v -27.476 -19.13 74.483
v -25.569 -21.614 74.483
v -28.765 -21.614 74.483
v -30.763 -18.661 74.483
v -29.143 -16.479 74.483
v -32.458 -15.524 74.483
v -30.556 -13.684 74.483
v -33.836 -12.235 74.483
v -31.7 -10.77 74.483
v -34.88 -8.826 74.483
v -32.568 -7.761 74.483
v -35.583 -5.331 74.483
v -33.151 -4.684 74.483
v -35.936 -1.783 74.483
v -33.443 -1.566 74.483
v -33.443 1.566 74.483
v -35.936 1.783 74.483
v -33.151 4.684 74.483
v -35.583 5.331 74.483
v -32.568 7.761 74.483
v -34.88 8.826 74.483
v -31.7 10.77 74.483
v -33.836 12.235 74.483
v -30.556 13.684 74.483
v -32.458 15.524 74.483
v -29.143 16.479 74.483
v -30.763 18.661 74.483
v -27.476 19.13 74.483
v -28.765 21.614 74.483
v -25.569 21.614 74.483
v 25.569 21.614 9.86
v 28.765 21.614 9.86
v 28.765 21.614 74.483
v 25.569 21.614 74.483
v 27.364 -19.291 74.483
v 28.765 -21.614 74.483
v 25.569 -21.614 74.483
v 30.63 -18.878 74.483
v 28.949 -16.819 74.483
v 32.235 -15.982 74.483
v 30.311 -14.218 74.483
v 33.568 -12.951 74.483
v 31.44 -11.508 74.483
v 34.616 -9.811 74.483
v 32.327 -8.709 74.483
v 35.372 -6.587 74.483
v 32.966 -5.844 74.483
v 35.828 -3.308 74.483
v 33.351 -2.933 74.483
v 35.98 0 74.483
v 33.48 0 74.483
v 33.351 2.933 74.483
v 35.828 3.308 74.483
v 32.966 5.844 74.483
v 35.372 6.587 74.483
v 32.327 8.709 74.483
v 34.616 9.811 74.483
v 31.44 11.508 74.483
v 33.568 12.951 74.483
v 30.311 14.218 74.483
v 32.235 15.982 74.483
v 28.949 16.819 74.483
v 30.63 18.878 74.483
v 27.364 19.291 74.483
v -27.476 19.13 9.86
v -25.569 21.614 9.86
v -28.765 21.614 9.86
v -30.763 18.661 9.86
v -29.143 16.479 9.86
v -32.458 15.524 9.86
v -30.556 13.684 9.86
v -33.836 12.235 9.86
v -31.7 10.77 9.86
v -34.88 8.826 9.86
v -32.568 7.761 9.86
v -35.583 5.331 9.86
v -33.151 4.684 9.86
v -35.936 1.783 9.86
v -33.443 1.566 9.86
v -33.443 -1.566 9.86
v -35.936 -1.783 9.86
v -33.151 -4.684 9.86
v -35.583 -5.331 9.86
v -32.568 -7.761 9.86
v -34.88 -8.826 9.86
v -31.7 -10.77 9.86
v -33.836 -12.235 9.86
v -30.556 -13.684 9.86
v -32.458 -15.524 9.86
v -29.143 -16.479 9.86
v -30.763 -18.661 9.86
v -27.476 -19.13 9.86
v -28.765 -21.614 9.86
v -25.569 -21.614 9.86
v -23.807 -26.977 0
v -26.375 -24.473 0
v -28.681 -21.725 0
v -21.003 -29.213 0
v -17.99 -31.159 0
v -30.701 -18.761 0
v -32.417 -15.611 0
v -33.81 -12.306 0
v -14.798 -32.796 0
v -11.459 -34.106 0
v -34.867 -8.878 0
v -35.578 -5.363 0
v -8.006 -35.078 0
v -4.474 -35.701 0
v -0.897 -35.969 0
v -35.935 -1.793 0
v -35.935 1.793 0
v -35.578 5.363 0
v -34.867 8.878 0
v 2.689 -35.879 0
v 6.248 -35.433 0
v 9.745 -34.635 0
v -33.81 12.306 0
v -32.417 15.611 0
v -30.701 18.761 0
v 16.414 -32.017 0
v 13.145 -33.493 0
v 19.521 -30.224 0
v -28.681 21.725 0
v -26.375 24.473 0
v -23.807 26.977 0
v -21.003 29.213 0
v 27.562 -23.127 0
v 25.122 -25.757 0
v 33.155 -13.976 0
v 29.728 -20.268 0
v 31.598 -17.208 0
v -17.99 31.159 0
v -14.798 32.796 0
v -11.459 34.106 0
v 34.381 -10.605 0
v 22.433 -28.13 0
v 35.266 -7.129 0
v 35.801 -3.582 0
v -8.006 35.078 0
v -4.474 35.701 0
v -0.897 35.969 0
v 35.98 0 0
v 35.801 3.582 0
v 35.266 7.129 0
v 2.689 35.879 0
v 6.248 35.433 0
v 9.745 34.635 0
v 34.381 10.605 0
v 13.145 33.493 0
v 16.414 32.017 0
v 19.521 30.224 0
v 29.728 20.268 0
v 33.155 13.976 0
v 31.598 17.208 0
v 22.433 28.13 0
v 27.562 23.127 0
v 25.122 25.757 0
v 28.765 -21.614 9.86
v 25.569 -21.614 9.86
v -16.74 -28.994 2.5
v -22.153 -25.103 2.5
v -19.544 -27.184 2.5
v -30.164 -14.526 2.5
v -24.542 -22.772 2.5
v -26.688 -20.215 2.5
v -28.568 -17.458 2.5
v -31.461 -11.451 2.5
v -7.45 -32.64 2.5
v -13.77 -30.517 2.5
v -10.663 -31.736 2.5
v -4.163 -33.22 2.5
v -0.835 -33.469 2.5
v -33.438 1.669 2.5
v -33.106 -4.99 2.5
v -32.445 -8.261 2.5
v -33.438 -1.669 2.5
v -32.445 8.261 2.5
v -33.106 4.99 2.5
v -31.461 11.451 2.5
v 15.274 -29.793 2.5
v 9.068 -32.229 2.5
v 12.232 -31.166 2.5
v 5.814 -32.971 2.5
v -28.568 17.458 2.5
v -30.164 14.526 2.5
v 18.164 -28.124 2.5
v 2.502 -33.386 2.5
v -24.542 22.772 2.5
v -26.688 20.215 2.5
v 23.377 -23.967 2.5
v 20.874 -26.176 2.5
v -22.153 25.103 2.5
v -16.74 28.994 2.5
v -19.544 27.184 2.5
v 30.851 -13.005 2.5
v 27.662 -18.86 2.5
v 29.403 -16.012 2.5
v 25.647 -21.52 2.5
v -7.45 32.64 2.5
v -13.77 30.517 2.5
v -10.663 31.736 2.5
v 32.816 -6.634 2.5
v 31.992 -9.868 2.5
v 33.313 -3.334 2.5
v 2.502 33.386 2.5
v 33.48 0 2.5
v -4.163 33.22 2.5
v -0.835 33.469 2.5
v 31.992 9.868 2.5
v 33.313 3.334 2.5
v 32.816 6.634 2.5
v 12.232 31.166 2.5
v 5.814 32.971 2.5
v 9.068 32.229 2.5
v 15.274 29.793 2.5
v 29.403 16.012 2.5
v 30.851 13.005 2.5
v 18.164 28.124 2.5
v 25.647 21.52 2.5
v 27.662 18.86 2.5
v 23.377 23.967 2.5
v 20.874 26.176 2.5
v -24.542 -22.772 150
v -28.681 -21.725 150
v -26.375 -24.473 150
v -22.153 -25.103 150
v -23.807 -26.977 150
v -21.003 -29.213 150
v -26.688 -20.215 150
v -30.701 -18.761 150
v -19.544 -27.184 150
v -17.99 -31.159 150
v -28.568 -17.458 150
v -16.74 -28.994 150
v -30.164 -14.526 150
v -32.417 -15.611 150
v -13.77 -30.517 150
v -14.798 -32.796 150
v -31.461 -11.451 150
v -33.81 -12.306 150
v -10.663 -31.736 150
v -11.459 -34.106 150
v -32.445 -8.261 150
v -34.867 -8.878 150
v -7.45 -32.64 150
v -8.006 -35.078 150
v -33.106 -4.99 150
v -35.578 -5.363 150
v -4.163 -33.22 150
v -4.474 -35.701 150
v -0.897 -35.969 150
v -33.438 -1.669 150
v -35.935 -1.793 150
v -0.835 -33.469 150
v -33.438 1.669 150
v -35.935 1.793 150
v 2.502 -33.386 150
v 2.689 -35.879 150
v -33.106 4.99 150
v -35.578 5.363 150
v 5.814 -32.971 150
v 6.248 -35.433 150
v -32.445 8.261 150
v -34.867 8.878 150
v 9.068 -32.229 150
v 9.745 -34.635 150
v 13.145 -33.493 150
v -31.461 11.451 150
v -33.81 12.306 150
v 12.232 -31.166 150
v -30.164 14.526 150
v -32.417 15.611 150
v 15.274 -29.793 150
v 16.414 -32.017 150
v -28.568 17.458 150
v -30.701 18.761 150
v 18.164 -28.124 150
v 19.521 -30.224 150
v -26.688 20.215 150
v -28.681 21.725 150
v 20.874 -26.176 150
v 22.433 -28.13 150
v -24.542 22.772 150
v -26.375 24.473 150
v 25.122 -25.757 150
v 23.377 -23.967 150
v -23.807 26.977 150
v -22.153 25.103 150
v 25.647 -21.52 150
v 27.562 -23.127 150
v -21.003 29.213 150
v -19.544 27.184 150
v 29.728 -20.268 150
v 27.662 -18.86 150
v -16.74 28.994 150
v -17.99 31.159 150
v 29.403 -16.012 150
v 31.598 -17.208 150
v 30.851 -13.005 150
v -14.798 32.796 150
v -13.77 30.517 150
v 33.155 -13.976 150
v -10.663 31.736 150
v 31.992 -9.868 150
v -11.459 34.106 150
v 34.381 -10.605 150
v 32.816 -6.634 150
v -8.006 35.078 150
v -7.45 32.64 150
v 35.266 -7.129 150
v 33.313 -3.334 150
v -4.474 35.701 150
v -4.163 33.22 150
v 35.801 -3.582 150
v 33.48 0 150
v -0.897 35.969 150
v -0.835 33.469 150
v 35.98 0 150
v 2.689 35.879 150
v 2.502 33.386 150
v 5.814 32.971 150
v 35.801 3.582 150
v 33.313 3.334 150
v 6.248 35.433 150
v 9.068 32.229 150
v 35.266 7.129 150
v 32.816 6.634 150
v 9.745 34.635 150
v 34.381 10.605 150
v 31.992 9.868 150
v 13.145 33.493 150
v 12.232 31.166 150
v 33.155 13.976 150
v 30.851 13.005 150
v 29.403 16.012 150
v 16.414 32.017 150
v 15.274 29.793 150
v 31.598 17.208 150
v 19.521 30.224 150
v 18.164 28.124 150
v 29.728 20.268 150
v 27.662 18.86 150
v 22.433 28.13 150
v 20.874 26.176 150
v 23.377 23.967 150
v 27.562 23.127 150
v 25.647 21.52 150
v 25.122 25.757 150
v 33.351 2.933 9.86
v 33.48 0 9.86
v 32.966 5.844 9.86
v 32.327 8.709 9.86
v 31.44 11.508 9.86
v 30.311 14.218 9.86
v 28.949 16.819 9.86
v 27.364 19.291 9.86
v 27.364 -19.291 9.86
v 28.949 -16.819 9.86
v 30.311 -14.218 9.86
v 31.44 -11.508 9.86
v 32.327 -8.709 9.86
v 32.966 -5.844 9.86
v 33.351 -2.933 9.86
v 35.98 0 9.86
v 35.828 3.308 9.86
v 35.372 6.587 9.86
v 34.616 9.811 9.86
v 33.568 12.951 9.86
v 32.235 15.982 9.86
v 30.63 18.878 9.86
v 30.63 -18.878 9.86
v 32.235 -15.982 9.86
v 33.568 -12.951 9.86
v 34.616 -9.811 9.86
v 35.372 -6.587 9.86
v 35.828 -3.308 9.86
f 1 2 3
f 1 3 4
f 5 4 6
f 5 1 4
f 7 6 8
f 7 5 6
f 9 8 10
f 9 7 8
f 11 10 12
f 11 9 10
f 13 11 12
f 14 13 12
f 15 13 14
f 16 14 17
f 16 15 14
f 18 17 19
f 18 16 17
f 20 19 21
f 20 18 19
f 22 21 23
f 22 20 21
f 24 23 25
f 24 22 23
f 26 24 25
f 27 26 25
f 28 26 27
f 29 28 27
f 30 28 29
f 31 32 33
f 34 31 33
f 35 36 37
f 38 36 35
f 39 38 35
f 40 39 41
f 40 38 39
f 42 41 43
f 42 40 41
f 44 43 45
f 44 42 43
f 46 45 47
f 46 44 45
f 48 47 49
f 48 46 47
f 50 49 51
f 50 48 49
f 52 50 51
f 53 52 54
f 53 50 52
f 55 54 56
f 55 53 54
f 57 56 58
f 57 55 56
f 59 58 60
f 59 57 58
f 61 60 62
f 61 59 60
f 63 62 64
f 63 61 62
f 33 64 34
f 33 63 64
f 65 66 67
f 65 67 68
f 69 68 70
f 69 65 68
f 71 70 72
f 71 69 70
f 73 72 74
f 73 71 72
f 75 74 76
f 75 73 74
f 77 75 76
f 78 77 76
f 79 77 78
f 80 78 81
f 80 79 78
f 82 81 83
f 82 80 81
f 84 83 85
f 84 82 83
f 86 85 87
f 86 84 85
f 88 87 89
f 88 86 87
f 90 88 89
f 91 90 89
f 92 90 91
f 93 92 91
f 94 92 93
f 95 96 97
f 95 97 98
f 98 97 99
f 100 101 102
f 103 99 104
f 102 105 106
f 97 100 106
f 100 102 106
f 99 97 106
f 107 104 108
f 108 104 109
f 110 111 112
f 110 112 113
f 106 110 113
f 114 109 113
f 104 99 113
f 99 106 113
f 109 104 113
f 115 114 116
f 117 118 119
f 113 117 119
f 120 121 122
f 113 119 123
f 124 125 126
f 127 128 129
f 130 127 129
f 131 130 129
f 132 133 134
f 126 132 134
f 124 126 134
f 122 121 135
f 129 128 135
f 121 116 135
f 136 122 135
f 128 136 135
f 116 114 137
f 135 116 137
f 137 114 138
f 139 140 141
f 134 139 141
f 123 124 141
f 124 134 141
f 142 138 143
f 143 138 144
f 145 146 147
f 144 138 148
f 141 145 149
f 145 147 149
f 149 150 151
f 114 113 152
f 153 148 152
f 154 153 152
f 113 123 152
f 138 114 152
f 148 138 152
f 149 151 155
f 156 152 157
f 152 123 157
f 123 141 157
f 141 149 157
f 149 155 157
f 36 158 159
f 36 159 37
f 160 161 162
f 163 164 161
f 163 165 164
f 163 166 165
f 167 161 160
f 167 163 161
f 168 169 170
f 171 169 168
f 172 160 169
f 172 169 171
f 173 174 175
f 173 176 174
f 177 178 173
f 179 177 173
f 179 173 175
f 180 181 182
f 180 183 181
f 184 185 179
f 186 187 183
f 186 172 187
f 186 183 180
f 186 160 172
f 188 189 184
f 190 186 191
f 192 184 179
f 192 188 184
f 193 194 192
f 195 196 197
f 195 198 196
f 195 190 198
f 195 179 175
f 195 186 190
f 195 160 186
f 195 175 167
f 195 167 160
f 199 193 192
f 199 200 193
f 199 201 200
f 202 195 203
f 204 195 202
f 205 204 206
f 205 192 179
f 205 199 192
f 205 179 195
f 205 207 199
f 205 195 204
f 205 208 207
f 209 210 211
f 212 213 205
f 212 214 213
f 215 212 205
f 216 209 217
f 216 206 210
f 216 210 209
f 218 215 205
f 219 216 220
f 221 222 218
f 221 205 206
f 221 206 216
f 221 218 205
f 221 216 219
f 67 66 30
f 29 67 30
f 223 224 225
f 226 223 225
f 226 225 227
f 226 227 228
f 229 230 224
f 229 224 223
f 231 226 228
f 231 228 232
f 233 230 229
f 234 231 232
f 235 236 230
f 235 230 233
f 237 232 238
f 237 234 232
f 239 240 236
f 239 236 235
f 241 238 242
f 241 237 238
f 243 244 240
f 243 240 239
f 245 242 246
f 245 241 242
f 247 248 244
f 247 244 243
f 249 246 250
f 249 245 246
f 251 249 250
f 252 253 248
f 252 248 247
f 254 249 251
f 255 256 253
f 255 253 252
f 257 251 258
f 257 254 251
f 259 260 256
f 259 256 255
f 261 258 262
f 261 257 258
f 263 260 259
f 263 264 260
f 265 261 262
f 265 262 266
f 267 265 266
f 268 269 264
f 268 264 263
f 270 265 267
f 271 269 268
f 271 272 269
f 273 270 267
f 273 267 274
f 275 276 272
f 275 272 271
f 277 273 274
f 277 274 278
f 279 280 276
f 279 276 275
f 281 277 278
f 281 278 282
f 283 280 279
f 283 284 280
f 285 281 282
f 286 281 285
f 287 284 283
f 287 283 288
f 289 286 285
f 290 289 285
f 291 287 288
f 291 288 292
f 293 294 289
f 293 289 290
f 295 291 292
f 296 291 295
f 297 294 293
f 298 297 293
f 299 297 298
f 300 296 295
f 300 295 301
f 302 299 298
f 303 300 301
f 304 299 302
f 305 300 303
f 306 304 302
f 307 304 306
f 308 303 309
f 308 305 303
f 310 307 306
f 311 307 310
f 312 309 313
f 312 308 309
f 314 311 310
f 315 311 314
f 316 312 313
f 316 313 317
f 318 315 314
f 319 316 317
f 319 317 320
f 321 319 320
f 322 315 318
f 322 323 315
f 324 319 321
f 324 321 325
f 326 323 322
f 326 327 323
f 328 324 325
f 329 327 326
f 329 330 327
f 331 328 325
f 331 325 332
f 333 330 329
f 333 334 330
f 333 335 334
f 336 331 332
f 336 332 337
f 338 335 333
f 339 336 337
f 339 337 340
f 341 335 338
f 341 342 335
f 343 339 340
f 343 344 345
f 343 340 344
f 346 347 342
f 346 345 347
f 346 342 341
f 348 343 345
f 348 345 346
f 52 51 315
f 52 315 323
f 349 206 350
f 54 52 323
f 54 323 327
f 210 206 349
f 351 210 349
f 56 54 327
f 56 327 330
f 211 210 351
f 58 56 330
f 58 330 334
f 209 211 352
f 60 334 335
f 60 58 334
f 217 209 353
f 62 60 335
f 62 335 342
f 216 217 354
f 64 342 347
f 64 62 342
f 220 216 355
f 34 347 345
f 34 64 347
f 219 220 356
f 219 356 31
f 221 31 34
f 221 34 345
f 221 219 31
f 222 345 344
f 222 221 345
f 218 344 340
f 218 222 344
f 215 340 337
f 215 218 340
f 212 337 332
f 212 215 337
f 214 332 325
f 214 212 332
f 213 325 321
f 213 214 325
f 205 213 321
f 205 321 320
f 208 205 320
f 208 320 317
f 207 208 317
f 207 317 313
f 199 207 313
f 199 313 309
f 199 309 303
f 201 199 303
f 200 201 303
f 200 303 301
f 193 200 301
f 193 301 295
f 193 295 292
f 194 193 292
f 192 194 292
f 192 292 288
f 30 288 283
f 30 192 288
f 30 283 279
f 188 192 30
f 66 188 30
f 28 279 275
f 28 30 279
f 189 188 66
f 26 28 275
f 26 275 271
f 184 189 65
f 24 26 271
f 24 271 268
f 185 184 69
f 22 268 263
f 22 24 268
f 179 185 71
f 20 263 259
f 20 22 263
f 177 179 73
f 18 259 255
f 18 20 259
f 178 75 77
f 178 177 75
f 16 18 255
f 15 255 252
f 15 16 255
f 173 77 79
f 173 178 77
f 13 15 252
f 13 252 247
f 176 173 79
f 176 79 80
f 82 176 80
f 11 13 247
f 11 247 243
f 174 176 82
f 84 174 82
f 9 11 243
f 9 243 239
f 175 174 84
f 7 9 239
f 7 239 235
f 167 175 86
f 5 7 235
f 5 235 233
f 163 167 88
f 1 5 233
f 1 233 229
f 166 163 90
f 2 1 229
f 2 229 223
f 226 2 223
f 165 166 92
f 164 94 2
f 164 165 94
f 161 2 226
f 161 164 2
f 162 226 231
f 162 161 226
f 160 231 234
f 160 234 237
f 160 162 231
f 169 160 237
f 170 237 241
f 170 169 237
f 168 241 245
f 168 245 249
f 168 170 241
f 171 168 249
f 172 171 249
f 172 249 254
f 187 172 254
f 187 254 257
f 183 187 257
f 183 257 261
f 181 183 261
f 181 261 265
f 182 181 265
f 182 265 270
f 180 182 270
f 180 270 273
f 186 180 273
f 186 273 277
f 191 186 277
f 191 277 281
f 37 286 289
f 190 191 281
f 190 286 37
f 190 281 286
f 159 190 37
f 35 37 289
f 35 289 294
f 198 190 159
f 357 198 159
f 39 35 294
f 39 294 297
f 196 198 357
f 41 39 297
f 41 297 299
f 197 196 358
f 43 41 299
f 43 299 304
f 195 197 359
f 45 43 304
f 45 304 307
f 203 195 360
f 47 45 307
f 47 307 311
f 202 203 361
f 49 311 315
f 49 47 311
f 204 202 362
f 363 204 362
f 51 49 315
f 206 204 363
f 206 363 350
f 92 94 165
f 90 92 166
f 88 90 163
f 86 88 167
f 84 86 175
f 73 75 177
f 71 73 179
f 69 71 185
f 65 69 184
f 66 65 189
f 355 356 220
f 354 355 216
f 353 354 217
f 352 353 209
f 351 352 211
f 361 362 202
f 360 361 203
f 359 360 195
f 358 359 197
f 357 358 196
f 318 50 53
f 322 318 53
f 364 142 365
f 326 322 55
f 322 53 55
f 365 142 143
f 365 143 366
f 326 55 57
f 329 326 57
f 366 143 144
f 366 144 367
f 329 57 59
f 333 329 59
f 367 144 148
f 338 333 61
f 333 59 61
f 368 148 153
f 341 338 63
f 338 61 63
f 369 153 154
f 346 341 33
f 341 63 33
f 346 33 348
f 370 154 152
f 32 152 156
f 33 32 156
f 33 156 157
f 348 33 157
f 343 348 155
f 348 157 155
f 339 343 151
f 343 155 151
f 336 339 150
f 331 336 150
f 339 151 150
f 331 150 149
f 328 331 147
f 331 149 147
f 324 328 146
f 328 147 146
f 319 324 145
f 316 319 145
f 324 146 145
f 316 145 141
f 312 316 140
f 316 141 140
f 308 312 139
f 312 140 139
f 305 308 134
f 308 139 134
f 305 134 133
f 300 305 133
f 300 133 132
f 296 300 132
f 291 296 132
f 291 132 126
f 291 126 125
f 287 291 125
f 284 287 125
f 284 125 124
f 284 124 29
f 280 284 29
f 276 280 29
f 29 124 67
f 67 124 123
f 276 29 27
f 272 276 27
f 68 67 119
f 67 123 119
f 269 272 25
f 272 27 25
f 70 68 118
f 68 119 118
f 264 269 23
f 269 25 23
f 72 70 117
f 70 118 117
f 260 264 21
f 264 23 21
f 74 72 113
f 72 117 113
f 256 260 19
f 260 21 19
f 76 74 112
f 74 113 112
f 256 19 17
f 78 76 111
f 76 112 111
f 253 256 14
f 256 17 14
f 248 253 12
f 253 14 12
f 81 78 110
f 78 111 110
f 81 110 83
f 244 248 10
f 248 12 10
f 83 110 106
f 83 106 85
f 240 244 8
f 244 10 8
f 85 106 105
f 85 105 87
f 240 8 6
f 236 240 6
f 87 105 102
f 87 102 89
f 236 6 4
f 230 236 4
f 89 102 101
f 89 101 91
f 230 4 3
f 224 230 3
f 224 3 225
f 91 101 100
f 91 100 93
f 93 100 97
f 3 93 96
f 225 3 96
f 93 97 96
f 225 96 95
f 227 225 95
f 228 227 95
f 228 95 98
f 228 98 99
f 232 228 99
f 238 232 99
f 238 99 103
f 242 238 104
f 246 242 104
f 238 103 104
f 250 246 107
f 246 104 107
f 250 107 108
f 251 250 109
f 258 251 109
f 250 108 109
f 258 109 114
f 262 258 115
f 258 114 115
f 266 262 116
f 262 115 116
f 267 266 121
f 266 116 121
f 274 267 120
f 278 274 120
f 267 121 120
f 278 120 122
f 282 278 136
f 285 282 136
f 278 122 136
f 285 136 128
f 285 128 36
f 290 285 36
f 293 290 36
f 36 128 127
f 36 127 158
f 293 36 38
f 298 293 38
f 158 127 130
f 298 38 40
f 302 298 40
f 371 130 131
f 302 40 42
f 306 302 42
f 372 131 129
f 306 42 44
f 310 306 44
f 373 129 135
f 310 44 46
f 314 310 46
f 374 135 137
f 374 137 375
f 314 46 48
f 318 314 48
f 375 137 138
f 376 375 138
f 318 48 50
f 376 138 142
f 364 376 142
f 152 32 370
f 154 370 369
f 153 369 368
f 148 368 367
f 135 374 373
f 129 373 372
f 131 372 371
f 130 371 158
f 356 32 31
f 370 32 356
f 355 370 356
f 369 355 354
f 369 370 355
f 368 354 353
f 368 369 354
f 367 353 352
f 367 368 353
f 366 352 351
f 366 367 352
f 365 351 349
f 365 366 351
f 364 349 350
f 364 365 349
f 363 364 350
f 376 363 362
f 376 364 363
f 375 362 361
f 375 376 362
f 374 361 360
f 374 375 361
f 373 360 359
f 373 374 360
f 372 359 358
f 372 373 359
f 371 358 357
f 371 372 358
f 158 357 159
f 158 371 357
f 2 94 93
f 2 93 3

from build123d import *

# Parameters (mm, degrees)
F0_R     = 35.9798684942
F1_DEPTH = 150
F2_T     = -2.5
F4_W     = 21.6136686504
F4_H     = 64.6223351359
F5_DEPTH = 150


with BuildPart() as f1:
    # F0 (on Top) → F1 (new body)
    with BuildSketch(Plane.XY):
        Circle(F0_R)
    extrude(amount=F1_DEPTH)

    # F2
    f2_openings = [f1.faces().sort_by_distance(p)[0] for p in [
        (0, 0, 150),
    ]]
    offset(amount=F2_T, openings=f2_openings)

    # F4 (on face) → F5 (cut)
    with BuildSketch(Plane(origin=(35.9798684942, 0, 0), x_dir=(0, -1, 0), z_dir=(-1, 0, 0))):
        with Locations((10.8068343252, 42.1714968979)):
            Rectangle(F4_W, F4_H)
        with Locations((-10.8068343252, 42.1714968979)):
            Rectangle(F4_W, F4_H)
    extrude(amount=F5_DEPTH, mode=Mode.SUBTRACT)


solid = f1.part
